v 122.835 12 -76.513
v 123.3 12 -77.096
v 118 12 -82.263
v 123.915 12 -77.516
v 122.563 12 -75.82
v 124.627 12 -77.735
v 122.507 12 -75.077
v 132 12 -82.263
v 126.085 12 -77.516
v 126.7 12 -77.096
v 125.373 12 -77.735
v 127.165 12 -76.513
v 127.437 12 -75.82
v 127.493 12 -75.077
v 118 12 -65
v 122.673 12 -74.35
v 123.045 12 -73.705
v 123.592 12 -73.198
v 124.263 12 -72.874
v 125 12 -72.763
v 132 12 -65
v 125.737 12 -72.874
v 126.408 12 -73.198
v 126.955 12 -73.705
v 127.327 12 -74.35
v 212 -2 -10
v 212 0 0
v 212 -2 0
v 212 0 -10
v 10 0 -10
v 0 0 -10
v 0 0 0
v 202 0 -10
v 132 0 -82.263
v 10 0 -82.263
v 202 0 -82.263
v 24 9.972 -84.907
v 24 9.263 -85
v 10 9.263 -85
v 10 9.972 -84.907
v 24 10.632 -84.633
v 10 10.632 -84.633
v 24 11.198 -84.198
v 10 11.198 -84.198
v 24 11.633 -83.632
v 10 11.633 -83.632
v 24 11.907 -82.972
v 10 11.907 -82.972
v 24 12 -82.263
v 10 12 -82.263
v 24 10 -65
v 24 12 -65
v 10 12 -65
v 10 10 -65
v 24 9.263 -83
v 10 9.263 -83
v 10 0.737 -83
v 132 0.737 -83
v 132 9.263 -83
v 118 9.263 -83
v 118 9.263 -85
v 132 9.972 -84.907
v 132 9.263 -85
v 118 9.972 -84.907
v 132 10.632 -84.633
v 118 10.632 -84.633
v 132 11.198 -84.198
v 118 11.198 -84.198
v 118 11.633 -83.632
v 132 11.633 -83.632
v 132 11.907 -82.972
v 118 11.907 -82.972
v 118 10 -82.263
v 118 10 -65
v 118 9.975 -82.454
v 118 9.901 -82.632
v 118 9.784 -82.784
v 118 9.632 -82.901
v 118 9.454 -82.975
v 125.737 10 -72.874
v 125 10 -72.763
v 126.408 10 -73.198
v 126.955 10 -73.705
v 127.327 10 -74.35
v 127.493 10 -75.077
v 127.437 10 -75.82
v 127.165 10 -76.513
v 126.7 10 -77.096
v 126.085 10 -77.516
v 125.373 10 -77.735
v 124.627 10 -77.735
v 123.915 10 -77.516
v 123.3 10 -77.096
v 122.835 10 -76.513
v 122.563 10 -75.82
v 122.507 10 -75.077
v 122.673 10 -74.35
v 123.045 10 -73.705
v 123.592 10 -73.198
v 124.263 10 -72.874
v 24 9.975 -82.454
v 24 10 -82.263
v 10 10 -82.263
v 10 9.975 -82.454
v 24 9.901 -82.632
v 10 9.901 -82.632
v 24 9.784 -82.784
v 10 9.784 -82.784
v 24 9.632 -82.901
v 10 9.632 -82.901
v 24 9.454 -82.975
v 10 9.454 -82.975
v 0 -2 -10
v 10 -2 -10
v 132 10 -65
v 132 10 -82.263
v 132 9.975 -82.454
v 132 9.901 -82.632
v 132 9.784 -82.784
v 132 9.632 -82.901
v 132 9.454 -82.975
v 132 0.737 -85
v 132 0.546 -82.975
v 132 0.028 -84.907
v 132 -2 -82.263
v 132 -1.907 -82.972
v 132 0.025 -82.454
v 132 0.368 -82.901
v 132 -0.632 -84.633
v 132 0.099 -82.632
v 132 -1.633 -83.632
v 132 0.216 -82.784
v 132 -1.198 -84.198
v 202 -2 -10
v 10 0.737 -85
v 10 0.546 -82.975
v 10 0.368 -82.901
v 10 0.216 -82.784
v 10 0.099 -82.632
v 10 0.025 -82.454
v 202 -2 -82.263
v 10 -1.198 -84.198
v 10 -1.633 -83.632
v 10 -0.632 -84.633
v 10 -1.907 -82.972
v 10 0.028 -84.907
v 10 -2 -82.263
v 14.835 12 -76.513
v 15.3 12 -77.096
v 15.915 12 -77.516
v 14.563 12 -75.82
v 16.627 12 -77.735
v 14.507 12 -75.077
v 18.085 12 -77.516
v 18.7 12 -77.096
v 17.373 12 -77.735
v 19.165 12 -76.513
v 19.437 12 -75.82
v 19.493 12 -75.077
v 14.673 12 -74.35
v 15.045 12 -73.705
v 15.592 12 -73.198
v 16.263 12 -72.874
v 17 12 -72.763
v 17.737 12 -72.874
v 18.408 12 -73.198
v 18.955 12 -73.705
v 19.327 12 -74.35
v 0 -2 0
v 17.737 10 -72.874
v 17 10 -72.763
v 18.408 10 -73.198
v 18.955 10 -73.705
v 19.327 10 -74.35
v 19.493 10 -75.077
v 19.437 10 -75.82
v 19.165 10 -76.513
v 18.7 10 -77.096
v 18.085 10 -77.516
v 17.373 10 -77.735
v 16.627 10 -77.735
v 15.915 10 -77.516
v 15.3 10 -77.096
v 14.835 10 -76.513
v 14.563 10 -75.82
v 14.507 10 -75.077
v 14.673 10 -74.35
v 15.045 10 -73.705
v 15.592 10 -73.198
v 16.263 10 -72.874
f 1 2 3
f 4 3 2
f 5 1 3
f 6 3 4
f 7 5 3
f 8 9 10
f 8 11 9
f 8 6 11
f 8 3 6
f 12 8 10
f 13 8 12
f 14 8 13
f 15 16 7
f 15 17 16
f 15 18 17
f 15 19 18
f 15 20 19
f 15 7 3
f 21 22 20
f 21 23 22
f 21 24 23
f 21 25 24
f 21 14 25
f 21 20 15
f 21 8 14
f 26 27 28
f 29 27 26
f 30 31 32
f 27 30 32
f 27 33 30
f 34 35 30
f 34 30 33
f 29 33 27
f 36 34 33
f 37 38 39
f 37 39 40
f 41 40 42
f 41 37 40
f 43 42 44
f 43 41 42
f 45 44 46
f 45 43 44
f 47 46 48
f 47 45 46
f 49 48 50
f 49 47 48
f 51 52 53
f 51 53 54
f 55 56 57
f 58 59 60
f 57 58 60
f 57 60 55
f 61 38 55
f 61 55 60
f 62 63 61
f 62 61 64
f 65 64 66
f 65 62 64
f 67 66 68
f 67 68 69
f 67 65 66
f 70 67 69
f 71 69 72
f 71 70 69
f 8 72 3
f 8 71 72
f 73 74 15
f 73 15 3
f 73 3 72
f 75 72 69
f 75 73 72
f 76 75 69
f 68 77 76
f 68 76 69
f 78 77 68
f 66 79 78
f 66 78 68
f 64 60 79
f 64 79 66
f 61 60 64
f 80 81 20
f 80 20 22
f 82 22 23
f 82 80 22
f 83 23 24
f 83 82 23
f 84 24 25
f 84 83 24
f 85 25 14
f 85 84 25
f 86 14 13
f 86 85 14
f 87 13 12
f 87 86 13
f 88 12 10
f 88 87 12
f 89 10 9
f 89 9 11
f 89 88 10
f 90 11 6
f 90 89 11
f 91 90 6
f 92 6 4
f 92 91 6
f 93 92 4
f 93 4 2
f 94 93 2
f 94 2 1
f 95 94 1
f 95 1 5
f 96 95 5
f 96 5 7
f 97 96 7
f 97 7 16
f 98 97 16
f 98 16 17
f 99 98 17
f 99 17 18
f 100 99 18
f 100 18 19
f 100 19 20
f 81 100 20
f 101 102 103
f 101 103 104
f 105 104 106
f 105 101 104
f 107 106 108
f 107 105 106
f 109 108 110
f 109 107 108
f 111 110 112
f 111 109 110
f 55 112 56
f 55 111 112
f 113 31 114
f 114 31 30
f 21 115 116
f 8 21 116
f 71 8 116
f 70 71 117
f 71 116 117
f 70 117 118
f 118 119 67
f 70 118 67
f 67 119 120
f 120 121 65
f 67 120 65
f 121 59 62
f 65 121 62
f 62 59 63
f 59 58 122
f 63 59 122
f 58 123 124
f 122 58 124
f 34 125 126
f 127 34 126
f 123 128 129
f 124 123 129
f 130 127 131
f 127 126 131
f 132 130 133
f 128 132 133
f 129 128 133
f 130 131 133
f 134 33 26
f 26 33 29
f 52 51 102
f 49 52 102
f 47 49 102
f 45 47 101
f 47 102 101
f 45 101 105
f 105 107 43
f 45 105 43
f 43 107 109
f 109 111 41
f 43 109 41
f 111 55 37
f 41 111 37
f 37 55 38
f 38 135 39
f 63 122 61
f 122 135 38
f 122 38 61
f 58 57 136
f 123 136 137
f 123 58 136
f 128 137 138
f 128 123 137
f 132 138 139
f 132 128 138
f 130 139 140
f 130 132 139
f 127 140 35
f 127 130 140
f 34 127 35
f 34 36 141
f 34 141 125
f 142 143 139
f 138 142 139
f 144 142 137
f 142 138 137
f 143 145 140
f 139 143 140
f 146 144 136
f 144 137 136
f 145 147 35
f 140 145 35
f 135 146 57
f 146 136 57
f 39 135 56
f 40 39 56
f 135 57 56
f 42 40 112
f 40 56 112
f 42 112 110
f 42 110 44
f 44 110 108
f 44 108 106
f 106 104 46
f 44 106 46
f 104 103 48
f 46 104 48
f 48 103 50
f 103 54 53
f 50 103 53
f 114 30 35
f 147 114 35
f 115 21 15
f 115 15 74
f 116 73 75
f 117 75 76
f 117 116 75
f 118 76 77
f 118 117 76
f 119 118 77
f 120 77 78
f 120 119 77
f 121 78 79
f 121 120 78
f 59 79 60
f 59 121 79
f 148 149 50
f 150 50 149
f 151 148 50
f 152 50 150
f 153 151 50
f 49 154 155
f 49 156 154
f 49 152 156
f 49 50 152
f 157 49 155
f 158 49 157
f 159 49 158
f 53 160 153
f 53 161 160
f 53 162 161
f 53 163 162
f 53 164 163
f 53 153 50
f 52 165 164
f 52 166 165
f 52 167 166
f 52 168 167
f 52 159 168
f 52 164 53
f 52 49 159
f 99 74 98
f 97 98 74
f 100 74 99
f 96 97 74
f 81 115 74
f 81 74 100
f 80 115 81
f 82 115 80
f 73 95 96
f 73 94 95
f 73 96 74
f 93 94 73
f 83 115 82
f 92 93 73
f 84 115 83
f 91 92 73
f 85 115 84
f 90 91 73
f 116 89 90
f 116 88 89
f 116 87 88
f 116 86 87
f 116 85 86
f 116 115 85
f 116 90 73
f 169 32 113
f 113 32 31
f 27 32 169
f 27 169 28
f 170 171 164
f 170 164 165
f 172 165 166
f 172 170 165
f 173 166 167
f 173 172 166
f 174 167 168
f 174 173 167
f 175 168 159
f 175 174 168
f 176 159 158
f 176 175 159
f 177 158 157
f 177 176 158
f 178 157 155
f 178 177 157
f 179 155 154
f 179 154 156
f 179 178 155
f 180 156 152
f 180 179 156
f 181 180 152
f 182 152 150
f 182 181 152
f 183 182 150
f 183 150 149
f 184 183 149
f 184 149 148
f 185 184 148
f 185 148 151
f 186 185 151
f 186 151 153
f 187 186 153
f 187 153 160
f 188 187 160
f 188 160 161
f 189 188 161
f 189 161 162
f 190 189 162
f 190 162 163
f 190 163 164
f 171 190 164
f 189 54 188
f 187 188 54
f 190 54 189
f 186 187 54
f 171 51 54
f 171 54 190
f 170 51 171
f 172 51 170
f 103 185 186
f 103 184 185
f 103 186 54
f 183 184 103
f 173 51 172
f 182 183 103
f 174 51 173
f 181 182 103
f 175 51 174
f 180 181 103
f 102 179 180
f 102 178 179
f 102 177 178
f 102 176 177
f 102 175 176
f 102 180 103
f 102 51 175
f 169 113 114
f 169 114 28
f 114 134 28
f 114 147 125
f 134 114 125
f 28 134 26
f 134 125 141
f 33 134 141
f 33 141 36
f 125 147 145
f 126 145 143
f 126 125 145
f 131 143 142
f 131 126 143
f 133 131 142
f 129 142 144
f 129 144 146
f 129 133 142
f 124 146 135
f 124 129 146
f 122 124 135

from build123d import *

# Parameters (mm, degrees)
SKETCH1_W                    = 212
SKETCH1_H                    = 85
BASE_FLANGE1_DEPTH           = 2
CUT_EXTRUDE1_REACH           = 230.414
SKETCH6_W                    = 10
SKETCH6_H                    = 75
EDGE_FLANGE1_STRIP_W         = 9.4732
EDGE_FLANGE1_STRIP_H         = 2
EDGE_FLANGE1_STRIP_CUT_DEPTH = 192
EDGE_FLANGE1_DEPTH           = 192
EDGE_FLANGE2_STRIP_W         = 9.4732
EDGE_FLANGE2_STRIP_H         = 2
EDGE_FLANGE2_STRIP_CUT_DEPTH = 192
EDGE_FLANGE2_DEPTH           = 192
CUT_EXTRUDE2_START           = -2.7366
SKETCH13_R                   = 2.5
SKETCH13_W                   = 70
SKETCH13_H                   = 20
SKETCH13_W_2                 = 94
CUT_EXTRUDE2_DEPTH           = 2.7366
CUT_EXTRUDE3_START           = -2.7366
SKETCH14_W                   = 70
SKETCH14_H                   = 11.2634
CUT_EXTRUDE3_DEPTH           = 2.7366


# Sheet-metal steps are written as plain solids
with BuildPart() as part:
    # Sketch1 → Base-Flange1 (new body)
    with BuildSketch(Plane(origin=(0, 0, 0), x_dir=(1, 0, 0), z_dir=(0, 1, 0))):
        with Locations((106, 42.5)):
            Rectangle(SKETCH1_W, SKETCH1_H)
    extrude(amount=-BASE_FLANGE1_DEPTH)

    # Sketch6 → Cut-Extrude1 (cut, up to next)
    with BuildSketch(Plane(origin=(0, 0, 0), x_dir=(1, 0, 0), z_dir=(0, 1, 0)), mode=Mode.PRIVATE) as cut_extrude1_sk1:
        with Locations((5, 47.5)):
            Rectangle(SKETCH6_W, SKETCH6_H)
    cut_extrude1_tool1 = extrude(cut_extrude1_sk1.sketch, amount=-CUT_EXTRUDE1_REACH, mode=Mode.PRIVATE) & part.part
    # Sketch6 → Cut-Extrude1 (cut, up to next)
    with BuildSketch(Plane(origin=(0, 0, 0), x_dir=(1, 0, 0), z_dir=(0, 1, 0)), mode=Mode.PRIVATE) as cut_extrude1_sk2:
        with Locations((207, 47.5)):
            Rectangle(SKETCH6_W, SKETCH6_H)
    cut_extrude1_tool2 = extrude(cut_extrude1_sk2.sketch, amount=-CUT_EXTRUDE1_REACH, mode=Mode.PRIVATE) & part.part
    add(cut_extrude1_tool1.solids().sort_by_distance((5, 0, -47.5))[0], mode=Mode.SUBTRACT)
    add(cut_extrude1_tool2.solids().sort_by_distance((207, 0, -47.5))[0], mode=Mode.SUBTRACT)

    # Edge-Flange1 strip (across the edge) → Edge-Flange1 strip cut (cut)
    with BuildSketch(Plane(origin=(202, 0, -85), x_dir=(0, 0, 1), z_dir=(-1, 0, 0))):
        with Locations((-2, -1)):
            Rectangle(EDGE_FLANGE1_STRIP_W, EDGE_FLANGE1_STRIP_H)
    extrude(amount=EDGE_FLANGE1_STRIP_CUT_DEPTH, mode=Mode.SUBTRACT)

    # Edge-Flange1 section (across the edge) → Edge-Flange1 (add)
    with BuildSketch(Plane(origin=(202, 0, -85), x_dir=(0, 0, 1), z_dir=(-1, 0, 0))):
        with BuildLine():
            Line((0, 0.7366), (0, 10))
            Line((0, 10), (2, 10))
            Line((2, 10), (2, 0.7366))
            ThreePointArc((2, 0.7366), (2.215745145, 0.215745145), (2.7366, 0))
            Line((2.7366, 0), (2.7366, -2))
            ThreePointArc((2.7366, -2), (0.801531583, -1.198468417), (0, 0.7366))
        make_face()
    extrude(amount=EDGE_FLANGE1_DEPTH)

    # Edge-Flange2 strip (across the edge) → Edge-Flange2 strip cut (cut)
    with BuildSketch(Plane(origin=(202, 10, -83), x_dir=(0, -1, 0), z_dir=(-1, 0, 0))):
        with Locations((-4, -1)):
            Rectangle(EDGE_FLANGE2_STRIP_W, EDGE_FLANGE2_STRIP_H)
    extrude(amount=EDGE_FLANGE2_STRIP_CUT_DEPTH, mode=Mode.SUBTRACT)

    # Edge-Flange2 section (across the edge) → Edge-Flange2 (add)
    with BuildSketch(Plane(origin=(202, 10, -83), x_dir=(0, -1, 0), z_dir=(-1, 0, 0))):
        with BuildLine():
            Line((-2, 0.7366), (-2, 18))
            Line((-2, 18), (0, 18))
            Line((0, 18), (0, 0.7366))
            ThreePointArc((0, 0.7366), (0.215745145, 0.215745145), (0.7366, 0))
            Line((0.7366, 0), (0.7366, -2))
            ThreePointArc((0.7366, -2), (-1.198468417, -1.198468417), (-2, 0.7366))
        make_face()
    extrude(amount=EDGE_FLANGE2_DEPTH)

    # Sketch13 → Cut-Extrude2 (cut)
    with BuildSketch(Plane(origin=(0, 12, 0), x_dir=(1, 0, 0), z_dir=(0, 1, 0)).offset(CUT_EXTRUDE2_START)):
        with Locations(Location((125, 75.2634, 0), (0, 0, 270))):
            Circle(SKETCH13_R)
        with Locations(Location((17, 75.2634, 0), (0, 0, 270))):
            Circle(SKETCH13_R)
        with Locations((167, 75)):
            Rectangle(SKETCH13_W, SKETCH13_H)
        with Locations((71, 75)):
            Rectangle(SKETCH13_W_2, SKETCH13_H)
    extrude(amount=CUT_EXTRUDE2_DEPTH, mode=Mode.SUBTRACT)

    # Sketch14 → Cut-Extrude3 (cut)
    with BuildSketch(Plane(origin=(0, 0, -85), x_dir=(-1, 0, 0), z_dir=(0, 0, -1)).offset(CUT_EXTRUDE3_START)):
        with Locations((-167, 3.6317)):
            Rectangle(SKETCH14_W, SKETCH14_H)
    extrude(amount=CUT_EXTRUDE3_DEPTH, mode=Mode.SUBTRACT)


solid = part.part
